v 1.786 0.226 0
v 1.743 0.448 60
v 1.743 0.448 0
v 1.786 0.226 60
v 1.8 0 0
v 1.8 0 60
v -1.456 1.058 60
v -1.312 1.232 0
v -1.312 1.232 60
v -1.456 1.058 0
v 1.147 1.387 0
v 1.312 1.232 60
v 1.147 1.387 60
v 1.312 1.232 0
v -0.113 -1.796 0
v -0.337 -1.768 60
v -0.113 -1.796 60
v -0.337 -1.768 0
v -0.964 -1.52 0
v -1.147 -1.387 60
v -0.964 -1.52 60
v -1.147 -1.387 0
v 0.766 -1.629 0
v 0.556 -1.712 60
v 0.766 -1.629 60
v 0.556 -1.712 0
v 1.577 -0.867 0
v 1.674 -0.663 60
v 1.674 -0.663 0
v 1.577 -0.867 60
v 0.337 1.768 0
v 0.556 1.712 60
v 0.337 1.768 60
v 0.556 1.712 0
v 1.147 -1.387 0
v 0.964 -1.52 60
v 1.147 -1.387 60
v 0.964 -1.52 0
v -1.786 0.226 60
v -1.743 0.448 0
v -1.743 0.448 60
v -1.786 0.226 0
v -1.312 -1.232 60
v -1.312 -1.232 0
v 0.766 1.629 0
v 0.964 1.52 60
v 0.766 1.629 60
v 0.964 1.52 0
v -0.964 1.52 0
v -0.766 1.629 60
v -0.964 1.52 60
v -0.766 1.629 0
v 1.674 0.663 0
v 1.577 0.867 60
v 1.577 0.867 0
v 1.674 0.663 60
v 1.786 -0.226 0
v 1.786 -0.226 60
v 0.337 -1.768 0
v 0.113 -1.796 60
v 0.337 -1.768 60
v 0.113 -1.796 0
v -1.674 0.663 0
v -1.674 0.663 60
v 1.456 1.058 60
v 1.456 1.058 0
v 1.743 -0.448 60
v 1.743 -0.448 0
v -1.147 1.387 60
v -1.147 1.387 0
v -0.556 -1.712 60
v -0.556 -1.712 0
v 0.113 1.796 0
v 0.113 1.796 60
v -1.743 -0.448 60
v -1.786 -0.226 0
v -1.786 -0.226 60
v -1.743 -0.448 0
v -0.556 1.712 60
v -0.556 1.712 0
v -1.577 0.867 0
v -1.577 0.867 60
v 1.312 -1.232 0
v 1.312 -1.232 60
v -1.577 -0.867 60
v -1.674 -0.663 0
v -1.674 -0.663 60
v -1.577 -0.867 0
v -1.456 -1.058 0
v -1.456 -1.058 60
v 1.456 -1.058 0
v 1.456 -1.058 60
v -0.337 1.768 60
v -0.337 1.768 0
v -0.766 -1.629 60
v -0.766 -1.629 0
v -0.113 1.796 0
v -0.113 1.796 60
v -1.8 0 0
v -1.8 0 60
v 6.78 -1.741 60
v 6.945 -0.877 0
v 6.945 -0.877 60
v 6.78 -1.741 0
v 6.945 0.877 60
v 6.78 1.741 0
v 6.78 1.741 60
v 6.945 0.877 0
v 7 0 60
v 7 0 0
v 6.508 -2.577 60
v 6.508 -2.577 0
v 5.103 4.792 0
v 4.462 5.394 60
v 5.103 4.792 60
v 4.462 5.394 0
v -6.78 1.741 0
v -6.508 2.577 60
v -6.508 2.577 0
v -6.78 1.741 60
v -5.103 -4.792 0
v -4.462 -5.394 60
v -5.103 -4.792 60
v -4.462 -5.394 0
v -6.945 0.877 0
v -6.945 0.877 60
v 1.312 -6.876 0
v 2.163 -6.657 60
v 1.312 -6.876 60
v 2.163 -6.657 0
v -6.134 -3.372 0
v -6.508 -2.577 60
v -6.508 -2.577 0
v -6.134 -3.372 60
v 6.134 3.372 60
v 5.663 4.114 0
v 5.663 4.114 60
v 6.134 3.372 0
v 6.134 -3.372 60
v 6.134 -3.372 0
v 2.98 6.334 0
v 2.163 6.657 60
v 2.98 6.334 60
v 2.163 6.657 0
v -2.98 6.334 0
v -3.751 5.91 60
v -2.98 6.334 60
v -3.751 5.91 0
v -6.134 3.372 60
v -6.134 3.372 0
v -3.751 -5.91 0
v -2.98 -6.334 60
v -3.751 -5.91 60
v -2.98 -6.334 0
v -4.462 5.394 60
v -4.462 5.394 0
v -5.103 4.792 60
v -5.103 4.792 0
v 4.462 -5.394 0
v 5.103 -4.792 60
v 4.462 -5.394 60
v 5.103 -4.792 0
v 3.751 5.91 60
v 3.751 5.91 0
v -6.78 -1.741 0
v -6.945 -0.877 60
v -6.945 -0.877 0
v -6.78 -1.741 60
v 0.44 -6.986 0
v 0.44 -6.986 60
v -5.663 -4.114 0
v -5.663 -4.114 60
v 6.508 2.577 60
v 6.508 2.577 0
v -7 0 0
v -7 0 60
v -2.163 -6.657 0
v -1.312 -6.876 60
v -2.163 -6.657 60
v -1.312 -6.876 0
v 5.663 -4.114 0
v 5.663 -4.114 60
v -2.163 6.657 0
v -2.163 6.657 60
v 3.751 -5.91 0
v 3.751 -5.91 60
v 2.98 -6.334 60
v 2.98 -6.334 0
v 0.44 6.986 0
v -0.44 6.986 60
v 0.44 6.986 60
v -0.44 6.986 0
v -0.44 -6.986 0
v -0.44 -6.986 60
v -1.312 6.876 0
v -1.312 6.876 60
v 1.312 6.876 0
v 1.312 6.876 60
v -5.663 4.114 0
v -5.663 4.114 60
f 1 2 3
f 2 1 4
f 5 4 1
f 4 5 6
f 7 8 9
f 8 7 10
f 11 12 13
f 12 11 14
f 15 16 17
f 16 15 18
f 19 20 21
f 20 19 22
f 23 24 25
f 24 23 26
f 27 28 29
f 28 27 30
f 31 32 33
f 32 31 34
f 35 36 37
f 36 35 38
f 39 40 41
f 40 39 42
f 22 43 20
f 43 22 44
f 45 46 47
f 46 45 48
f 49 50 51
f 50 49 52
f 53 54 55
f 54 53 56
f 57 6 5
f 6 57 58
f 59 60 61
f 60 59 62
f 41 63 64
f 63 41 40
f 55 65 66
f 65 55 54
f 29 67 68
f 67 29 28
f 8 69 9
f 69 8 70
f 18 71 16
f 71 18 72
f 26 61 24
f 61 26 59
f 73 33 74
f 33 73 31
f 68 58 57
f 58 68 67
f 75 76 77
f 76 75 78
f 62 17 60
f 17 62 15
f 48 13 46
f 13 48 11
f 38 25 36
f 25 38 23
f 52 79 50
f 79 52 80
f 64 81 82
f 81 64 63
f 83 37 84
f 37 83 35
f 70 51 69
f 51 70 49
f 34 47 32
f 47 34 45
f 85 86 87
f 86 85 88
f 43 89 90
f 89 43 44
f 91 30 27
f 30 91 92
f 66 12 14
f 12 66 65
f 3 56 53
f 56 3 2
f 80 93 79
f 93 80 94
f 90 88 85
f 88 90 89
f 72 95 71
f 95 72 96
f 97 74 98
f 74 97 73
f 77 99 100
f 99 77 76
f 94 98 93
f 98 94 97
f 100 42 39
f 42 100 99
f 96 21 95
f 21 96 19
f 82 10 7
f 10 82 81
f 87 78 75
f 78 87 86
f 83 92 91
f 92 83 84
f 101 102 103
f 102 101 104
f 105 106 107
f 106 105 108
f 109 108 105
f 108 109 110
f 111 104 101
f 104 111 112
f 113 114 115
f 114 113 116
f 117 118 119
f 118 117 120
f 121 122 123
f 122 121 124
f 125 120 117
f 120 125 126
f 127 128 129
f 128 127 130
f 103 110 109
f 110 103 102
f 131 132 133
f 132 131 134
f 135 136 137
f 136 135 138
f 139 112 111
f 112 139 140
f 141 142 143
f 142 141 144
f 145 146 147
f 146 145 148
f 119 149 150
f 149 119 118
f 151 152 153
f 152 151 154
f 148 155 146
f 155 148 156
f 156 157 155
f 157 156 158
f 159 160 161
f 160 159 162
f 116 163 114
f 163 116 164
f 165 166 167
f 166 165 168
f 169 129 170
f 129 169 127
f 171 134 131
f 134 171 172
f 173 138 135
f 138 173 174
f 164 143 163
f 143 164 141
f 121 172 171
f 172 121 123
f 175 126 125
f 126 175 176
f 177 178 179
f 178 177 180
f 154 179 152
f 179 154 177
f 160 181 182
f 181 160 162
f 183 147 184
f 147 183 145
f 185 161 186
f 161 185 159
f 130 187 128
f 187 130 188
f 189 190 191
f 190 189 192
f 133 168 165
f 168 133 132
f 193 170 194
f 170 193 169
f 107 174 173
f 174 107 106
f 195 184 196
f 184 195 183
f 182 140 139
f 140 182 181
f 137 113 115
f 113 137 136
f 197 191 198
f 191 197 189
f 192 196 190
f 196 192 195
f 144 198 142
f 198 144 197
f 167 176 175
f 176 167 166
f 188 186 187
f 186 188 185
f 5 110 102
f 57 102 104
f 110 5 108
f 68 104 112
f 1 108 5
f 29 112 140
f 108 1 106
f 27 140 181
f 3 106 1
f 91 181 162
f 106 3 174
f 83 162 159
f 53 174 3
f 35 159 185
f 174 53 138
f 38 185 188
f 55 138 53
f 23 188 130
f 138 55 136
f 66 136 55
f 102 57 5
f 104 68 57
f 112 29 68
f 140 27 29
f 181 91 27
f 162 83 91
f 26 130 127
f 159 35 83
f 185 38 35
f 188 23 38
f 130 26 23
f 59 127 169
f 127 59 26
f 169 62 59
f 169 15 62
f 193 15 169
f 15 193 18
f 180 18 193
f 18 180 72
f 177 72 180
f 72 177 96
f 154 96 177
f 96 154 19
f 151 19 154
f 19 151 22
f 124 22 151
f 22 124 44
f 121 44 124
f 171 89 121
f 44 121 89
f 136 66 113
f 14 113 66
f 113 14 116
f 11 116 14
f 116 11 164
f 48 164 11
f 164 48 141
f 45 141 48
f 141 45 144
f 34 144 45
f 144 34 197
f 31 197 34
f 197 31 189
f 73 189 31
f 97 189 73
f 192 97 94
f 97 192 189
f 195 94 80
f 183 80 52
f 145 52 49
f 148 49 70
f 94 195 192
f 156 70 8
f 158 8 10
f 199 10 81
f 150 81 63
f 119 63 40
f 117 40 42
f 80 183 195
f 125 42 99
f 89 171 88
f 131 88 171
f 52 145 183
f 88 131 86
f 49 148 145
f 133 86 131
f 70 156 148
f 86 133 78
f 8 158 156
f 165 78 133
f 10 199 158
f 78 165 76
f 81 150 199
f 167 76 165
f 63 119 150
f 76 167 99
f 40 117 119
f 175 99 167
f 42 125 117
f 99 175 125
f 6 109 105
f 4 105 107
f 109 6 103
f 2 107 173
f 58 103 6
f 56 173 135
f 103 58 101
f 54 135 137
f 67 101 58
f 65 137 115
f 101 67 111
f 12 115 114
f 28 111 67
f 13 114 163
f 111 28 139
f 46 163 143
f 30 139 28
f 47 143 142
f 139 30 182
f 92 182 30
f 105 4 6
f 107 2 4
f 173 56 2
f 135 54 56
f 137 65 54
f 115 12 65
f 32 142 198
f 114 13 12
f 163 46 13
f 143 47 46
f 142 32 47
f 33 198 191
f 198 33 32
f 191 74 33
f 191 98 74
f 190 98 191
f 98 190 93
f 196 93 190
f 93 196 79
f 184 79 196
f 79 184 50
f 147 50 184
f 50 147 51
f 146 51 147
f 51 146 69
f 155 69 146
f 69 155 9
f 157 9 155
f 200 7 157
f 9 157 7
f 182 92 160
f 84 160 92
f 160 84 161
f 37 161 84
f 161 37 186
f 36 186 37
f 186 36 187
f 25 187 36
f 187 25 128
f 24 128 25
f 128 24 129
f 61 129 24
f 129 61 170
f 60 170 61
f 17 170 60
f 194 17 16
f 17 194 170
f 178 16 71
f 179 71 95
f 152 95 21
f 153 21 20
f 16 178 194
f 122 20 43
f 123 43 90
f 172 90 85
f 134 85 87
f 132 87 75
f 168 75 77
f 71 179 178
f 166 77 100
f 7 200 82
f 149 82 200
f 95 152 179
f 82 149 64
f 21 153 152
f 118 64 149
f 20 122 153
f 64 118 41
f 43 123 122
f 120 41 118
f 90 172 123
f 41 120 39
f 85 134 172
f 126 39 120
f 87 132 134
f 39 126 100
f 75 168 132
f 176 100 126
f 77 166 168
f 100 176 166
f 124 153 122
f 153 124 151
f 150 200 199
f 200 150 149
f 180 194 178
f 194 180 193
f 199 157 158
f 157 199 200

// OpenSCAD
$fn = 50;


difference() {
	union() {
		cylinder(h = 60, r = 7.0000000000);
	}
	union() {
		translate(v = [0, 0, -100]) {
			cylinder(h = 200, r = 1.8000000000);
		}
		translate(v = [0, 0, -100]) {
			cylinder(h = 200, r = 1.8000000000);
		}
	}
}
